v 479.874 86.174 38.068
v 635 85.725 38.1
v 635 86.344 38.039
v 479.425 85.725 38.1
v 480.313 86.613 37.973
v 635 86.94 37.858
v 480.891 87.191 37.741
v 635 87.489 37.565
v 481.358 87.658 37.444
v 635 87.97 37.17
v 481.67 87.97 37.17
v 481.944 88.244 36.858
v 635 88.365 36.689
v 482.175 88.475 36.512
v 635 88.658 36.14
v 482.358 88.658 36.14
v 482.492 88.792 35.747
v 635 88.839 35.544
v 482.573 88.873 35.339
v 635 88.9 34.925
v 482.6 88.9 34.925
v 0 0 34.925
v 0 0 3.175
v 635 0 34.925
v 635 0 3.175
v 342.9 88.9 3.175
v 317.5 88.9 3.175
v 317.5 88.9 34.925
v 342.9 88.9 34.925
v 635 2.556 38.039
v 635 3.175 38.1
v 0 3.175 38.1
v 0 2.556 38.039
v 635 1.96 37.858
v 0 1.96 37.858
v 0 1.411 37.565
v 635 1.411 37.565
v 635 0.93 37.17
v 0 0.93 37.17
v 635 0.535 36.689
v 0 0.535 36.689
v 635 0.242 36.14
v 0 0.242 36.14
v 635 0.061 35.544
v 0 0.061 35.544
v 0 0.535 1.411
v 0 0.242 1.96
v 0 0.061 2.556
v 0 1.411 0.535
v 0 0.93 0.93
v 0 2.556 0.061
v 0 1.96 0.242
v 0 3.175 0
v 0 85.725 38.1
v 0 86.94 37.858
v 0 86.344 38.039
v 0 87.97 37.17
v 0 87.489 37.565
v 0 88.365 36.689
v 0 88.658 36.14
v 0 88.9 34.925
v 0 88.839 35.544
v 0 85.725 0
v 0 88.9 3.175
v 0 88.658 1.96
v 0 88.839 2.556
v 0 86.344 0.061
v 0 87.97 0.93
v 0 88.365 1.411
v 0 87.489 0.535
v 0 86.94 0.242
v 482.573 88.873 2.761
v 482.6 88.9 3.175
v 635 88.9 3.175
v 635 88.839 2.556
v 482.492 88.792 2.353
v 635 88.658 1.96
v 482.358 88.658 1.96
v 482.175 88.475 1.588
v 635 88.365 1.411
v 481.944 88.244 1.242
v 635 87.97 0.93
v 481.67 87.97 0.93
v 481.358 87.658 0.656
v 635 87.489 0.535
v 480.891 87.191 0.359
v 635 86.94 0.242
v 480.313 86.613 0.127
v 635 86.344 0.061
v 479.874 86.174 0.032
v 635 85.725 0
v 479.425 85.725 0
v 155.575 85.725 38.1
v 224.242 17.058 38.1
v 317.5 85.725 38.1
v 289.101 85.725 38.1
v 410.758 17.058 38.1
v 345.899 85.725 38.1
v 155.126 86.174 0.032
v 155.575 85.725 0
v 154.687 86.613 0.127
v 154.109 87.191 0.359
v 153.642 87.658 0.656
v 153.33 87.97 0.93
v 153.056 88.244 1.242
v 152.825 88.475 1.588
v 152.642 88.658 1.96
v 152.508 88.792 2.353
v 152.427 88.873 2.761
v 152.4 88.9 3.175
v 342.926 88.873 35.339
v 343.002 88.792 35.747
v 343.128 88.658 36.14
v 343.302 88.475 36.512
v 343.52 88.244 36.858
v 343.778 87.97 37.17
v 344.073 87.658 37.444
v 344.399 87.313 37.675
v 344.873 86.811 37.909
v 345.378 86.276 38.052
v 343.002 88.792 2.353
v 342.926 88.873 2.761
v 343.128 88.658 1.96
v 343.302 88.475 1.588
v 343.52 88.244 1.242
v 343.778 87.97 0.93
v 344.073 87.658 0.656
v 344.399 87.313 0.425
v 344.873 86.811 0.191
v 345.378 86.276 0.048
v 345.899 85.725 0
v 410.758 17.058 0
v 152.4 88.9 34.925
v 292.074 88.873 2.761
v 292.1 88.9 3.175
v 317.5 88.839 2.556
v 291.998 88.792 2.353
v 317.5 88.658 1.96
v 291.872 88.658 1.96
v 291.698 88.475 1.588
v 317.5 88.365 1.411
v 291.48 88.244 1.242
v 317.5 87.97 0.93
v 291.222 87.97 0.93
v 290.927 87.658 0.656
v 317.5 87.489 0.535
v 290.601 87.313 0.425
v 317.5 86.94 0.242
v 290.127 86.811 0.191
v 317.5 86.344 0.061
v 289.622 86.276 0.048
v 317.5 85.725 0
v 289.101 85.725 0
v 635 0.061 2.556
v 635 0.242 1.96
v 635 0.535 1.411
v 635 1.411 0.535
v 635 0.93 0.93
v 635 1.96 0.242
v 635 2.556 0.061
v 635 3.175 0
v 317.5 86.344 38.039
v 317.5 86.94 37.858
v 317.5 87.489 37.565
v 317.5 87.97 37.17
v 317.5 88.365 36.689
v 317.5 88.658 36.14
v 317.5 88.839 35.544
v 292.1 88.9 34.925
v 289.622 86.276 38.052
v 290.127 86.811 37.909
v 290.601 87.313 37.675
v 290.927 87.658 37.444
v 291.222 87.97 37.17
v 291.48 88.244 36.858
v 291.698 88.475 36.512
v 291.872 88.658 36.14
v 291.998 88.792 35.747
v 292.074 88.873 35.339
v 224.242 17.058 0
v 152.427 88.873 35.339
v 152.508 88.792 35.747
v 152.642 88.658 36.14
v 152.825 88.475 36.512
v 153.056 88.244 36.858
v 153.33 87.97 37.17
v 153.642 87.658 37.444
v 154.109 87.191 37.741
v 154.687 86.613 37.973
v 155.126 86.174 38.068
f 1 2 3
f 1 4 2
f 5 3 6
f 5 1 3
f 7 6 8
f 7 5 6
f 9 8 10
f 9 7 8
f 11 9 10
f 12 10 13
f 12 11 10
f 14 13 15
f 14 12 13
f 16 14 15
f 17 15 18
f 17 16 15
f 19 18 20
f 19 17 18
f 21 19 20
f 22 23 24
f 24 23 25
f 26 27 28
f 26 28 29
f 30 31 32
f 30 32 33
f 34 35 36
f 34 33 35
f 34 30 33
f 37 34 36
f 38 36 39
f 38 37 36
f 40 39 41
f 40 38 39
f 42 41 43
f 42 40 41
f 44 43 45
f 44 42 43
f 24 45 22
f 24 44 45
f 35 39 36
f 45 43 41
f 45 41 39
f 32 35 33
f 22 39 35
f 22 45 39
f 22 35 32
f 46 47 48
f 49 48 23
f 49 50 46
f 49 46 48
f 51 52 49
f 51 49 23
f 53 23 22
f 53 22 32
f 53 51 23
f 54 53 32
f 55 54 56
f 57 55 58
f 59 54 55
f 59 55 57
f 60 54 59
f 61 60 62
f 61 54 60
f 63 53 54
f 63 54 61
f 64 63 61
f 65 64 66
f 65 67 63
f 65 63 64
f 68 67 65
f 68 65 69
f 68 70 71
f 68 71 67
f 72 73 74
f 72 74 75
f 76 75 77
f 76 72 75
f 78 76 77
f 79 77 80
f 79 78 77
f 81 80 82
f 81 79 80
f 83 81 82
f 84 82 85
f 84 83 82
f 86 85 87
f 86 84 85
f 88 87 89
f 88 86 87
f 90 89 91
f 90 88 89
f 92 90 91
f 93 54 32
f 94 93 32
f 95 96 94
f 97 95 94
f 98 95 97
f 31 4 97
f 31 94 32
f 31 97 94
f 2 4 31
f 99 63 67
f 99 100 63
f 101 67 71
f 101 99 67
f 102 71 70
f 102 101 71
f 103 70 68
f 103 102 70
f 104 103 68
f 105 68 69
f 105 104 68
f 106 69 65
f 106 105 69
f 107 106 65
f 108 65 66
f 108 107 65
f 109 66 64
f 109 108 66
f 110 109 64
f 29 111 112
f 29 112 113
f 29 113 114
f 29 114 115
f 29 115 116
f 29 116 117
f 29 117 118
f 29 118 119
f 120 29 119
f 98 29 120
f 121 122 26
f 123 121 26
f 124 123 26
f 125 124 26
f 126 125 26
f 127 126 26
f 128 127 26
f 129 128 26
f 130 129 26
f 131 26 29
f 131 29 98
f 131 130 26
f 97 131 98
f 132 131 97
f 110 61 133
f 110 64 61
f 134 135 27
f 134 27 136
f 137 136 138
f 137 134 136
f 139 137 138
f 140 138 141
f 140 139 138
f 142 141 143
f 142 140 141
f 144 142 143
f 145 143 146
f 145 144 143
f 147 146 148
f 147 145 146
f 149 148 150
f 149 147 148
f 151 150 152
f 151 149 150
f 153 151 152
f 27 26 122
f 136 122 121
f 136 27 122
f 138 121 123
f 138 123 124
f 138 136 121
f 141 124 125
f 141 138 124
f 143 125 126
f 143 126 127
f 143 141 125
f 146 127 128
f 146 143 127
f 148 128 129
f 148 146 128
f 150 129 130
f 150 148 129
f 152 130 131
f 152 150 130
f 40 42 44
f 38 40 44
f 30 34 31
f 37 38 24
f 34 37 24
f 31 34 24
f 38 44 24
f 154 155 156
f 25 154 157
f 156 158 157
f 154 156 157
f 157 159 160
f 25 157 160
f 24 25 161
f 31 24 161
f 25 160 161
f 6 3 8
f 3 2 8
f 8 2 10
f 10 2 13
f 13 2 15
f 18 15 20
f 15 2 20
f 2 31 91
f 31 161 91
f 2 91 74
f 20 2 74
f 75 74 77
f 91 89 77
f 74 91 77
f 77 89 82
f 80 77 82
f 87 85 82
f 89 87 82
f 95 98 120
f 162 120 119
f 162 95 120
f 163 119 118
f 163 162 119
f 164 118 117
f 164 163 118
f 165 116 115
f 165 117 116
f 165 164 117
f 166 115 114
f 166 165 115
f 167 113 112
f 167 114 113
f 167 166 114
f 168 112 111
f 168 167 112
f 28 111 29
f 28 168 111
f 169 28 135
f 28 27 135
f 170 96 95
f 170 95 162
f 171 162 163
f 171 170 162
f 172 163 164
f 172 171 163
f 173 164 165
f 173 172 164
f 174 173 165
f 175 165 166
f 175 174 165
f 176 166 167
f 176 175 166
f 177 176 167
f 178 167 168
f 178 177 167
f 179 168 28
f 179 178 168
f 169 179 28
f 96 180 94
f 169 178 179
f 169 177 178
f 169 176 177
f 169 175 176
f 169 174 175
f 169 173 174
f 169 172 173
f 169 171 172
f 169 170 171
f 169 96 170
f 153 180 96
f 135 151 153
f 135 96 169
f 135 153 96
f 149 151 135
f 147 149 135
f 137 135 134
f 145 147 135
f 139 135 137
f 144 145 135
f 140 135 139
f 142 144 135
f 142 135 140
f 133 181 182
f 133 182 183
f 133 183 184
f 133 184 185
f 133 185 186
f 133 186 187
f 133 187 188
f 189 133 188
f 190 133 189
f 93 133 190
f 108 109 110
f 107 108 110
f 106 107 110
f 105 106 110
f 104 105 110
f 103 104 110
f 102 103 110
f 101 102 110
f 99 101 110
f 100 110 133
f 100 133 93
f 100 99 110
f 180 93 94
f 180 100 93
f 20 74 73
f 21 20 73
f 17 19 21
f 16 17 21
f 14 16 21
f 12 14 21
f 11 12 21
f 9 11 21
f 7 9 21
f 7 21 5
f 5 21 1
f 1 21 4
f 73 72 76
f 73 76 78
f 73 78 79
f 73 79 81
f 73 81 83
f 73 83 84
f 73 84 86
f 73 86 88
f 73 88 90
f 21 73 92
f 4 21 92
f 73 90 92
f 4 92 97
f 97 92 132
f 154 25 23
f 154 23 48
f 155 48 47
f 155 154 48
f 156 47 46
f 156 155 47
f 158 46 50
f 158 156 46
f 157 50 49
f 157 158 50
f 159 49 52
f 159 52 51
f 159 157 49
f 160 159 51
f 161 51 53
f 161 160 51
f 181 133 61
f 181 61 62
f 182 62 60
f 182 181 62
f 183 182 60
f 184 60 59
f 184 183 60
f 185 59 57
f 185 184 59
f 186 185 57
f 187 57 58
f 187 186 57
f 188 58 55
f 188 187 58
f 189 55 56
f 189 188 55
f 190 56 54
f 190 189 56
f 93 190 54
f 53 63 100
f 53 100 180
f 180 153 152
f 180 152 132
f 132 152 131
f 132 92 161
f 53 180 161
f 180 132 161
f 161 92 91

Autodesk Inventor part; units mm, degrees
ref_plane "YZ Plane" through (0, 0, 0) normal (1, 0, 0) x (0, 1, 0)
ref_plane "XZ Plane" through (0, 0, 0) normal (0, 1, 0) x (-1, 0, 0)
ref_plane "XY Plane" through (0, 0, 0) normal (0, 0, 1) x (1, 0, 0)
sketch "Sketch1" plane through (0, 0, 0) normal (0, 0, 1) x (1, 0, 0)
  line L0 (0, 0) -> (635, 0)
  line L1 (635, 0) -> (635, 88.9)
  line L2 (0, 0) -> (0, 88.9)
  line L3 (0, 88.9) -> (152.4, 88.9)
  line L4 (635, 88.9) -> (482.6, 88.9)
  line L5 (482.6, 88.9) -> (152.4, 88.9) construction
  line L6 (317.5, 88.9) -> (292.1, 88.9)
  line L7 (317.5, 88.9) -> (342.9, 88.9)
  line L8 (482.6, 88.9) -> (410.758, 17.058)
  line L9 (482.6, 88.9) -> (584.2, 88.9) construction
  line L10 (342.9, 88.9) -> (410.758, 17.058)
  line L11 (152.4, 88.9) -> (224.242, 17.058)
  line L12 (152.4, 88.9) -> (254, 88.9) construction
  line L13 (224.242, 17.058) -> (292.1, 88.9)
  dimension "d0" = 635
  dimension "d1" = 88.9
  dimension "d2" = 88.9
  dimension "d3" = 152.4
  dimension "d4" = 152.4
  dimension "d5" = 25.4
  dimension "d6" = 25.4
  dimension "d7" = 101.6
  dimension "d8" = 135
  dimension "d9" = 101.6
  dimension "d10" = 45
extrude "Extrusion1" add sketch "Sketch1" along normal blind 38.1
fillet "Fillet1" radius 3.175 8 edges at (317.5, 0, 0) (76.2, 88.9, 0) (304.8, 88.9, 0) (558.8, 88.9, 0) (558.8, 88.9, 38.1) (304.8, 88.9, 38.1) (76.2, 88.9, 38.1) (317.5, 0, 38.1)
properties part number "Lower Decoration"
